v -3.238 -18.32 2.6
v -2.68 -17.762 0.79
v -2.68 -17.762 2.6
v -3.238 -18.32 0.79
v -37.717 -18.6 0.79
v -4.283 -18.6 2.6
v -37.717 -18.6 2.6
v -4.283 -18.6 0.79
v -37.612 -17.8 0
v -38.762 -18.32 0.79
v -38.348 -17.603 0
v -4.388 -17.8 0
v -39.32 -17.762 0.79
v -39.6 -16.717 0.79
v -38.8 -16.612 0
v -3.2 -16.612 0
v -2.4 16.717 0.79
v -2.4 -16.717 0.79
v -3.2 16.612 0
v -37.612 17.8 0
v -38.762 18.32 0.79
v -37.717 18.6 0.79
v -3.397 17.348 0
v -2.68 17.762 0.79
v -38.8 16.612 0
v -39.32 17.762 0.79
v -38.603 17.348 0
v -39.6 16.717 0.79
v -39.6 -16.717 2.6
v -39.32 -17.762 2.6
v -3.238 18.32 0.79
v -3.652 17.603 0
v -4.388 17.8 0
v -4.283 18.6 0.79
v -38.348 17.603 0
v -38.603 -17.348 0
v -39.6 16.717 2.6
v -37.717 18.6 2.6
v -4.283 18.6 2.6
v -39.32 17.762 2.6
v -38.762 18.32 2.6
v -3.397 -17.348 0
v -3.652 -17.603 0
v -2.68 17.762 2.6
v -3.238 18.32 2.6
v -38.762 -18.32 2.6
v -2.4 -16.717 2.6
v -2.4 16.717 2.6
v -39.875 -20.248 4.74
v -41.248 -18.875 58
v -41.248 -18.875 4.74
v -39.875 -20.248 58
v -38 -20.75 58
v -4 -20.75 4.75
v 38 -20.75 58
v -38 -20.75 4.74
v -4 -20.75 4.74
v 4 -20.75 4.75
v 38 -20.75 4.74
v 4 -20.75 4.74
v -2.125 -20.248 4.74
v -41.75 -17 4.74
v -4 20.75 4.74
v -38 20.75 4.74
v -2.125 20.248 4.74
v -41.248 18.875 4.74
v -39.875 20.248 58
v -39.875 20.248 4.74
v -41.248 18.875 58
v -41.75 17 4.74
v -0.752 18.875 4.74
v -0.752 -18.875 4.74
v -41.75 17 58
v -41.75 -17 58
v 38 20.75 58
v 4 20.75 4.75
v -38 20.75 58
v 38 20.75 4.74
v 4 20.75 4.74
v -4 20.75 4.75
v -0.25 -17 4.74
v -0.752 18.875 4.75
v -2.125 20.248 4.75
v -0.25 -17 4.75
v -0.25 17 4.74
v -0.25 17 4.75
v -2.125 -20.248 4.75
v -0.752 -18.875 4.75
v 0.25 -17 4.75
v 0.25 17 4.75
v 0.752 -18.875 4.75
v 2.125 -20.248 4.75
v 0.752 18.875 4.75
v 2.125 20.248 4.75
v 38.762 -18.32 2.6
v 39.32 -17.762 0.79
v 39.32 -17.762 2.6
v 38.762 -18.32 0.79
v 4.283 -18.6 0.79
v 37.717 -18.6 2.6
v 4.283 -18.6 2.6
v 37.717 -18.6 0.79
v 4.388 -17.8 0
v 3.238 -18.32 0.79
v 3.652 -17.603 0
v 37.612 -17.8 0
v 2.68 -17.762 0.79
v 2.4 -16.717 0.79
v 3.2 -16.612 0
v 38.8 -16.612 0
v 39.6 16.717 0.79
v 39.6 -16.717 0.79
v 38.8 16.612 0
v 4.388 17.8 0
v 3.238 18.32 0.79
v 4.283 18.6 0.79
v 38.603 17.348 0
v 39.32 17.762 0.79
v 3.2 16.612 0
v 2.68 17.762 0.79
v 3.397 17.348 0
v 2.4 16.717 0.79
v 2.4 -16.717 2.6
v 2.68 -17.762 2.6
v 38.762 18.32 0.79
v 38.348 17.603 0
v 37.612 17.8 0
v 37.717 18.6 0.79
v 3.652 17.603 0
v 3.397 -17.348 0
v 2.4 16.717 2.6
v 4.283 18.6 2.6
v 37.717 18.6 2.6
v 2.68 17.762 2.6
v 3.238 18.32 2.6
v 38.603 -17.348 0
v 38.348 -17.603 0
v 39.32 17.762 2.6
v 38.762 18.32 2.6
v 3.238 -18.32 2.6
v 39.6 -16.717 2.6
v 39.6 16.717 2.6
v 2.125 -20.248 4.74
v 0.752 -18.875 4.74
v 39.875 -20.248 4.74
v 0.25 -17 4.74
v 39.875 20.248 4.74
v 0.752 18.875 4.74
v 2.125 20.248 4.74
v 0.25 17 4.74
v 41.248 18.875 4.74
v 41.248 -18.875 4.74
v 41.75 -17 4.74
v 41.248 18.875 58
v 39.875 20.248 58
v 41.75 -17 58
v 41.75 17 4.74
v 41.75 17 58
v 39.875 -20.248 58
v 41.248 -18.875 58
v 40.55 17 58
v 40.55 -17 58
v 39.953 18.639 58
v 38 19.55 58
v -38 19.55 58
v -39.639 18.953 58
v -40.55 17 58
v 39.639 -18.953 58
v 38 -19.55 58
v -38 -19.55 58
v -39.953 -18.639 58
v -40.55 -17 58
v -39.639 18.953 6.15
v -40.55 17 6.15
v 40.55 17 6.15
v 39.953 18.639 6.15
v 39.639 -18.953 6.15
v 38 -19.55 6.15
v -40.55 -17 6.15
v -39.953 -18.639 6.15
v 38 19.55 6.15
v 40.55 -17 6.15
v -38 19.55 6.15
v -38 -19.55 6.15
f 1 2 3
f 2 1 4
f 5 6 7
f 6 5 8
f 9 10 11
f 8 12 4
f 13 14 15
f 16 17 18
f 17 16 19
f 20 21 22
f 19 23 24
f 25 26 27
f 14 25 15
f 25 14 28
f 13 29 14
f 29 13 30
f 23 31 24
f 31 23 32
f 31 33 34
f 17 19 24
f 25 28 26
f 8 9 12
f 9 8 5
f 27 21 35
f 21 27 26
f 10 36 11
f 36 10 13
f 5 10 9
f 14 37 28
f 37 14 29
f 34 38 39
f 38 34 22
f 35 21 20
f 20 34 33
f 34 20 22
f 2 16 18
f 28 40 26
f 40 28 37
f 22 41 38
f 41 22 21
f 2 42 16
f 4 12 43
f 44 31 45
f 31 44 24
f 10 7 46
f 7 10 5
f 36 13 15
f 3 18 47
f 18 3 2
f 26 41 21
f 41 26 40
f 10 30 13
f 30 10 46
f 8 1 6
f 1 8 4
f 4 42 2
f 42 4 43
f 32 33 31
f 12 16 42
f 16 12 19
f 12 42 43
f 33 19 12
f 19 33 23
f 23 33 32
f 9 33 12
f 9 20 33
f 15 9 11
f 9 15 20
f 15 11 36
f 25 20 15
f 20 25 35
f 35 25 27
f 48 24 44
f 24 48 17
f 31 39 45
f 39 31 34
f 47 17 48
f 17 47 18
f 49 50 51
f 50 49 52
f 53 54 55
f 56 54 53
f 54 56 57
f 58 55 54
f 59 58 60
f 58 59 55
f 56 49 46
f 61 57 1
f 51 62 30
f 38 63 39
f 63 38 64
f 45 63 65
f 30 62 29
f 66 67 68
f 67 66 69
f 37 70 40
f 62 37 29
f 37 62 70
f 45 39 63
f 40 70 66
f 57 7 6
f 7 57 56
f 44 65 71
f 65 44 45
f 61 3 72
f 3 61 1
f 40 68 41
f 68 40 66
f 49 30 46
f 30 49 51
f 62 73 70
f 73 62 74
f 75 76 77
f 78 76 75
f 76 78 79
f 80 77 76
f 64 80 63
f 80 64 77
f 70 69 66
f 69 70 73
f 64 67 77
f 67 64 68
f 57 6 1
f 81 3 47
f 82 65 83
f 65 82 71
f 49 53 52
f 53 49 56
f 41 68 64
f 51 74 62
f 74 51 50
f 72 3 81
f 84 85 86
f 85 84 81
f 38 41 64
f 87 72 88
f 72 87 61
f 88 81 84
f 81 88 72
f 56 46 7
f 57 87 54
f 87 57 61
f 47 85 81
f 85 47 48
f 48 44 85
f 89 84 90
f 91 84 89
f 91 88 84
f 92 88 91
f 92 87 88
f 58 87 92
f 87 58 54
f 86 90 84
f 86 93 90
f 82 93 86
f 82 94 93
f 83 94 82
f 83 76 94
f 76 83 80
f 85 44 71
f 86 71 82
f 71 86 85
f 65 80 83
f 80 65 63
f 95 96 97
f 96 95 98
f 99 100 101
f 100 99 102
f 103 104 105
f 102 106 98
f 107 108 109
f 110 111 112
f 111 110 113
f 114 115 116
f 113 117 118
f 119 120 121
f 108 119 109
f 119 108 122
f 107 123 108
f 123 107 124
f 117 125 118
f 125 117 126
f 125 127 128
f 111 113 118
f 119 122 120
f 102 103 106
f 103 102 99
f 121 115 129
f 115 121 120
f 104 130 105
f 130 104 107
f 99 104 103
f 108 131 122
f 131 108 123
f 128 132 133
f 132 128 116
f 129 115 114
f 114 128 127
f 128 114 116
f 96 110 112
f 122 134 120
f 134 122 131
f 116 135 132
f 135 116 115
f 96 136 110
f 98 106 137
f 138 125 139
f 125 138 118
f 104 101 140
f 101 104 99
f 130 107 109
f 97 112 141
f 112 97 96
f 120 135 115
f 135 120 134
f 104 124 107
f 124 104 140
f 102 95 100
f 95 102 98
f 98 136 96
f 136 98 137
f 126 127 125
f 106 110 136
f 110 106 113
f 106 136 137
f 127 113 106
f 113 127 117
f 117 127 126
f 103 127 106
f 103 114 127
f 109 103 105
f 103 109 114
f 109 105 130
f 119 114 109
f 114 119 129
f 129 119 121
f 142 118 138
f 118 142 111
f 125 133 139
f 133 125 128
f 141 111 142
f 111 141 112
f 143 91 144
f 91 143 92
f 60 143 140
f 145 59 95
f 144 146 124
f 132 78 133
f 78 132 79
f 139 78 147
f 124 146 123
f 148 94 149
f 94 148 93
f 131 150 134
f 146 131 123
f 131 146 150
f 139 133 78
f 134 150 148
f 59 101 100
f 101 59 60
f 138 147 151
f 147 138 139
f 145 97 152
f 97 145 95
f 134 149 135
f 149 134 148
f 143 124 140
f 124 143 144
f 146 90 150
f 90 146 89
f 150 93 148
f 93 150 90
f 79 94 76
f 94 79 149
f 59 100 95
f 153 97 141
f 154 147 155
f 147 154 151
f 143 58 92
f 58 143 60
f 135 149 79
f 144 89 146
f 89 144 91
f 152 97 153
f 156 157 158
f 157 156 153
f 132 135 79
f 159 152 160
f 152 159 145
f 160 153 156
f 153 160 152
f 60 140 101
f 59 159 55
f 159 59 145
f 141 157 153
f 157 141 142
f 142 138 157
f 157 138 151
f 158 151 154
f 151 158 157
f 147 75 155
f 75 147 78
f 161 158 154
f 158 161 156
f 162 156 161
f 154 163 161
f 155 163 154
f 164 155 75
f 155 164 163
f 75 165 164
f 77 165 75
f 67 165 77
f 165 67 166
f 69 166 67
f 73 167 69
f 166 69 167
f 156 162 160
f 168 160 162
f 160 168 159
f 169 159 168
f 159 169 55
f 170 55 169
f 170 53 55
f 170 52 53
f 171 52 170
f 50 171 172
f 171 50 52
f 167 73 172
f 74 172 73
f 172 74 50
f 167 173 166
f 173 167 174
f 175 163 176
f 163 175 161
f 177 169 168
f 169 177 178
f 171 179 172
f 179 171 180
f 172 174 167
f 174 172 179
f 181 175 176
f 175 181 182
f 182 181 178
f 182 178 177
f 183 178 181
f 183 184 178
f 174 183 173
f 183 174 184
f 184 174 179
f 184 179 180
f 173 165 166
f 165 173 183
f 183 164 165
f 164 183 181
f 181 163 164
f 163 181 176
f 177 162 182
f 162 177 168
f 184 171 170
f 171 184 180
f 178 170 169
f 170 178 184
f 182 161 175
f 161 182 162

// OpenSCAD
// file: ../lib/vessel.scad
// SPDX-License-Identifier: MIT
// Copyright (c) 2026 Aaron Cupp
//
// vessel.scad — parametric collar cups for bottles, cans, and pen-form tools.
//
// A collar cup is a solid Gridfinity block with cylindrical bores sunk into it.
// It LOCATES a vessel; it does not clamp one. That distinction is the whole
// design: a collar that grips harder than the bin weighs comes out of the
// baseplate with the bottle when you grab it one-handed. Clearance, not
// interference — CLR is per-diameter, not per-side.
//
// Capture depth is roughly a third of the vessel's height. Enough to resist a
// knock (this bench sits under a 180 W fume-extractor intake), not so much that
// you're fishing the bottle out.
//
//   collar_cup(nx, ny, vessel_d, capture_h, …)   — one centred bore
//   collar_cup_multi(nx, ny, bores, capture_h, …) — bores = [[x, y, d], …]
//
// Cord slot: pen-form tools that stand in a cup are usually corded (the HARDELL
// rotary tool takes a barrel jack). Without a slot the lead drapes over the rim
// and levers the tool sideways. `cord_w > 0` cuts a channel from the bore out
// through the wall, open to the top.

include <gridfinity.scad>

CLR      = 1.0;   // bore = vessel_d + CLR. Loose on purpose — see above.
MIN_WALL = 1.2;   // minimum material between two bores, and bore to outer face

// ---- geometry guards ----
// Overlapping bores and bores that break out through the side wall both still
// render as perfectly watertight, 2-manifold meshes — CI cannot tell you the
// part is wrong, only that it is closed. These asserts encode the intent that
// the mesh check can't. Cheap, and they fire at render time rather than on the
// printer.
function _pair_gaps(bores, clr) = [
    for (i = [0 : len(bores)-1], j = [0 : len(bores)-1]) if (i < j)
        norm([bores[i][0]-bores[j][0], bores[i][1]-bores[j][1]])
        - (bores[i][2]+clr)/2 - (bores[j][2]+clr)/2
];
function _edge_gaps(bores, clr, W, D) = [
    for (b = bores) min(W/2 - abs(b[0]) - (b[2]+clr)/2,
                        D/2 - abs(b[1]) - (b[2]+clr)/2)
];

// Multi-bore block. Bores are [x, y, diameter] in mm, relative to the block centre.
module collar_cup_multi(nx, ny, bores, capture_h, floor = 1.4, clr = CLR,
                        cord_w = 0, cord_at = 0, min_wall = MIN_WALL) {
    h = BIN_BASE_H + floor + capture_h;
    e = 0.1;
    W = nx*GF - 0.5; D = ny*GF - 0.5;
    _pg = _pair_gaps(bores, clr);
    _eg = _edge_gaps(bores, clr, W, D);
    assert(len(_pg) == 0 || min(_pg) >= min_wall,
           "collar_cup: bores are too close — they would merge into one pocket");
    assert(min(_eg) >= min_wall,
           "collar_cup: a bore breaches the outer wall — block needs more units");
    difference() {
        bin_blank(nx, ny, h);
        for (b = bores)
            translate([b[0], b[1], BIN_BASE_H + floor])
                cylinder(d = b[2] + clr, h = capture_h + e, $fn = 96);
        // Cord channel: from the first bore outward through the +X wall, open to
        // the rim so the lead drops in from above rather than threading.
        if (cord_w > 0)
            translate([bores[0][0], bores[0][1] - cord_w/2, BIN_BASE_H + floor + cord_at])
                cube([nx*GF, cord_w, h]);
    }
}

// Single centred bore — the common case.
module collar_cup(nx, ny, vessel_d, capture_h, floor = 1.4, clr = CLR,
                  cord_w = 0, cord_at = 0, min_wall = MIN_WALL) {
    collar_cup_multi(nx, ny, [[0, 0, vessel_d]], capture_h, floor, clr,
                     cord_w, cord_at, min_wall);
}

// Evenly spaced row of same-depth bores along X — for a rank of aerosol cans.
// Returns geometry, not a list; pass the diameters and it lays them out on the
// block's centre line.
module collar_cup_row(nx, ny, diameters, capture_h, floor = 1.4, clr = CLR,
                      min_wall = MIN_WALL) {
    n = len(diameters);
    pitch = nx * GF / n;
    collar_cup_multi(nx, ny,
        [for (i = [0 : n-1]) [(i - (n-1)/2) * pitch, 0, diameters[i]]],
        capture_h, floor, clr, 0, 0, min_wall);
}
// file: cleaning_station_common.scad
// cleaning_station_common.scad — shared parameters for the bench cleaning station.
//
// The IPA / contact-cleaner corner of the electronics repair bench. Everything
// here is measured off the actual items with calipers; nothing is a nominal from
// a product page. Diameters carry a per-diameter clearance (lib/vessel.scad CLR),
// not per-side.
//
// This corner sits under a fume-extractor intake, which drives two decisions:
//   * Cups CAPTURE the vessel rather than clamp it — a collar that grips harder
//     than the bin weighs lifts out of the baseplate with the bottle.
//   * Bins stay as low as the job allows. Capture velocity is decided in the
//     first six inches, and a wall of tall bins in front of the hood costs it.
//
// The aerosols are FLAMMABLE and this bench has a 400 °C iron on it. These cups
// are for working cans only; bulk stock belongs away from the hood entirely.
//
// SPDX-License-Identifier: CC-BY-NC-SA-4.0
// Copyright (c) 2026 Aaron Cupp

include <../lib/vessel.scad>

// ---- measured diameters (mm) ----
// DeoxIT bore: taken from the PART, not from a can measurement.
//
// The 2026-08-20 print had three bores — 57.00 / 55.20 / 52.75. The 57.00 fits a
// DeoxIT; 55.20 barely does; 52.75 holds nothing. So 57.00 is a validated bore,
// which beats re-deriving it from a can diameter plus a clearance guess. D5, F5
// and G5 are the same can, so one bore serves all three.
BORE_DEOXIT = 57.00;   // ✅ proven by the printed part

// Freeze spray is a DIFFERENT, LARGER can — 13 mm wider than a DeoxIT, which is
// why it never fitted a shared block.
D_FREEZE_SPRAY = 69.00;   // ✅ measured 2026-08-20 (was 56.00, badly wrong)
FREEZE_CLR     = 2.0;     // [1:0.5:4] -> 71.00 bore
FREEZE_MEASURED = true;

D_DISPENSER    = 53.50;   // 200 ml push-down alcohol pump, square base across flats
D_FLOOD_BOTTLE = 75.50;

// DeoxIT D100 / F100 / G100 concentrate droppers — bare bottles, out of their
// kit boxes. The boxes are a full 2×1 EACH; the three bare bottles share one.
// NOT ROUND — 39 × 20 is a flattened cross-section, not a diameter and a height.
D_DROPPER_L = 39.00;   // measured 2026-08-20, long axis of the footprint
D_DROPPER_W = 20.00;   // measured, short axis
DROPPER_CLR = 1.00;    // per dimension, matching the CLR convention
CAP_DROPPER = 26;      // [8:1:40] capture depth. ⚠️ bottle HEIGHT is unmeasured —
                       //   39 turned out to be a footprint, so the height nobody
                       //   has taken.
                       //   RAISED 15 → 26 on 2026-08-24: at 15 the brushes and
                       //   swabs fell over in their slots. Depth is what resists
                       //   an applicator tipping, and 15 mm of it on a ~100 mm
                       //   brush is almost none. 26 makes the whole block half
                       //   again as tall, which is what was asked for.
                       //   Read the bin_deoxit_droppers header before assuming
                       //   this alone fixes the tipping — it does not.

// ---- melamine sponges (mm) — 3.94 × 2.35 × 0.79 in ----
// Full block as sold. Bulk stock lives in the bag under the desk, ~100 of them;
// none of it competes for grid.
SPONGE_L = 100.1; SPONGE_W = 59.7; SPONGE_T = 20.1;

// WORKING size: a full block is far more sponge than any bench task needs, and
// melamine is consumed by abrasion — quartering one gets four uses out of what
// was one, and the smaller piece reaches between connectors where a 100 mm block
// cannot. Halve across, halve lengthwise.
CUT_L = SPONGE_L / 2;   // 50.05
CUT_W = SPONGE_W / 2;   // 29.85
CUT_T = SPONGE_T;       // 20.1 — unchanged, cuts are through the face

// ---- capture depth ----
// Vessel HEIGHTS were not measured, so this is a judgement call rather than a
// derived third-of-height: 50 mm resists a knock without making the bottles a
// two-handed retrieval. One number to change if the first print feels wrong.
CAPTURE = 50;

// Sponge bin: sponges stand ON EDGE (60 mm tall), ~4 across the 81 mm interior.
// On edge beats flat-stacked — same count in a 68 mm bin instead of a 107 mm one,
// and any sponge can be pinched out rather than peeling off the top of a pile.
// Height is set by a FULL block standing on edge, not a cut one — so one uncut
// block can still ride in the bin as reserve alongside the trimmed pieces.
// Cut pieces are 50 long, which is what lets the footprint drop to 2×2.
SPONGE_BIN_H = SPONGE_W + BIN_BASE_H + 1.4 + 2;   // ≈ 68
// main file
// bin_micro_sponges — 2×1 open bin for mechanic's micro cleaning sponges.
//
// AN OPEN BIN, NOT A FITTED TRAY, AND THAT IS DELIBERATE. The sponges were
// described as "prob 20×20" — an estimate, not a reading. A fitted pocket built
// on an estimate is how a part ends up unusable; an open bin does not care. You
// tip them in and take one out.
//
// So no sponge dimension appears anywhere below. The only number that matters is
// how deep the bin is, and that is a choice about how many you want to hold, not
// a claim about the sponges.
//
// A 2×1's interior is 81.1 × 39.1 mm. At a nominal 20 mm that is four across and
// one deep per layer, so the height sets the stack.
//
// PRINT: as emitted, feet down. No supports.
//
// SPDX-License-Identifier: CC-BY-NC-SA-4.0
// Copyright (c) 2026 Aaron Cupp
include <cleaning_station_common.scad>
include <../lib/gridfinity.scad>

NX = 2; NY = 1;
H  = 58;    // [16:1:90] matches bin_swabs' HIGH side — its hopper wall and dam
            //   both stand at 58, so the two sit level on the plate rather than
            //   stepping. bin_swabs' front wall is 26 and is deliberately lower;
            //   this follows the tall side, not that one.

WALL = 1.2; FLOOR = 1.4;

echo(str("interior ", NX*GF - 0.5 - 2*WALL, " x ", NY*GF - 0.5 - 2*WALL,
         " mm, usable depth ", H - BIN_BASE_H - FLOOR, " mm"));

bin(NX, NY, H, wall = WALL, floor = FLOOR);
